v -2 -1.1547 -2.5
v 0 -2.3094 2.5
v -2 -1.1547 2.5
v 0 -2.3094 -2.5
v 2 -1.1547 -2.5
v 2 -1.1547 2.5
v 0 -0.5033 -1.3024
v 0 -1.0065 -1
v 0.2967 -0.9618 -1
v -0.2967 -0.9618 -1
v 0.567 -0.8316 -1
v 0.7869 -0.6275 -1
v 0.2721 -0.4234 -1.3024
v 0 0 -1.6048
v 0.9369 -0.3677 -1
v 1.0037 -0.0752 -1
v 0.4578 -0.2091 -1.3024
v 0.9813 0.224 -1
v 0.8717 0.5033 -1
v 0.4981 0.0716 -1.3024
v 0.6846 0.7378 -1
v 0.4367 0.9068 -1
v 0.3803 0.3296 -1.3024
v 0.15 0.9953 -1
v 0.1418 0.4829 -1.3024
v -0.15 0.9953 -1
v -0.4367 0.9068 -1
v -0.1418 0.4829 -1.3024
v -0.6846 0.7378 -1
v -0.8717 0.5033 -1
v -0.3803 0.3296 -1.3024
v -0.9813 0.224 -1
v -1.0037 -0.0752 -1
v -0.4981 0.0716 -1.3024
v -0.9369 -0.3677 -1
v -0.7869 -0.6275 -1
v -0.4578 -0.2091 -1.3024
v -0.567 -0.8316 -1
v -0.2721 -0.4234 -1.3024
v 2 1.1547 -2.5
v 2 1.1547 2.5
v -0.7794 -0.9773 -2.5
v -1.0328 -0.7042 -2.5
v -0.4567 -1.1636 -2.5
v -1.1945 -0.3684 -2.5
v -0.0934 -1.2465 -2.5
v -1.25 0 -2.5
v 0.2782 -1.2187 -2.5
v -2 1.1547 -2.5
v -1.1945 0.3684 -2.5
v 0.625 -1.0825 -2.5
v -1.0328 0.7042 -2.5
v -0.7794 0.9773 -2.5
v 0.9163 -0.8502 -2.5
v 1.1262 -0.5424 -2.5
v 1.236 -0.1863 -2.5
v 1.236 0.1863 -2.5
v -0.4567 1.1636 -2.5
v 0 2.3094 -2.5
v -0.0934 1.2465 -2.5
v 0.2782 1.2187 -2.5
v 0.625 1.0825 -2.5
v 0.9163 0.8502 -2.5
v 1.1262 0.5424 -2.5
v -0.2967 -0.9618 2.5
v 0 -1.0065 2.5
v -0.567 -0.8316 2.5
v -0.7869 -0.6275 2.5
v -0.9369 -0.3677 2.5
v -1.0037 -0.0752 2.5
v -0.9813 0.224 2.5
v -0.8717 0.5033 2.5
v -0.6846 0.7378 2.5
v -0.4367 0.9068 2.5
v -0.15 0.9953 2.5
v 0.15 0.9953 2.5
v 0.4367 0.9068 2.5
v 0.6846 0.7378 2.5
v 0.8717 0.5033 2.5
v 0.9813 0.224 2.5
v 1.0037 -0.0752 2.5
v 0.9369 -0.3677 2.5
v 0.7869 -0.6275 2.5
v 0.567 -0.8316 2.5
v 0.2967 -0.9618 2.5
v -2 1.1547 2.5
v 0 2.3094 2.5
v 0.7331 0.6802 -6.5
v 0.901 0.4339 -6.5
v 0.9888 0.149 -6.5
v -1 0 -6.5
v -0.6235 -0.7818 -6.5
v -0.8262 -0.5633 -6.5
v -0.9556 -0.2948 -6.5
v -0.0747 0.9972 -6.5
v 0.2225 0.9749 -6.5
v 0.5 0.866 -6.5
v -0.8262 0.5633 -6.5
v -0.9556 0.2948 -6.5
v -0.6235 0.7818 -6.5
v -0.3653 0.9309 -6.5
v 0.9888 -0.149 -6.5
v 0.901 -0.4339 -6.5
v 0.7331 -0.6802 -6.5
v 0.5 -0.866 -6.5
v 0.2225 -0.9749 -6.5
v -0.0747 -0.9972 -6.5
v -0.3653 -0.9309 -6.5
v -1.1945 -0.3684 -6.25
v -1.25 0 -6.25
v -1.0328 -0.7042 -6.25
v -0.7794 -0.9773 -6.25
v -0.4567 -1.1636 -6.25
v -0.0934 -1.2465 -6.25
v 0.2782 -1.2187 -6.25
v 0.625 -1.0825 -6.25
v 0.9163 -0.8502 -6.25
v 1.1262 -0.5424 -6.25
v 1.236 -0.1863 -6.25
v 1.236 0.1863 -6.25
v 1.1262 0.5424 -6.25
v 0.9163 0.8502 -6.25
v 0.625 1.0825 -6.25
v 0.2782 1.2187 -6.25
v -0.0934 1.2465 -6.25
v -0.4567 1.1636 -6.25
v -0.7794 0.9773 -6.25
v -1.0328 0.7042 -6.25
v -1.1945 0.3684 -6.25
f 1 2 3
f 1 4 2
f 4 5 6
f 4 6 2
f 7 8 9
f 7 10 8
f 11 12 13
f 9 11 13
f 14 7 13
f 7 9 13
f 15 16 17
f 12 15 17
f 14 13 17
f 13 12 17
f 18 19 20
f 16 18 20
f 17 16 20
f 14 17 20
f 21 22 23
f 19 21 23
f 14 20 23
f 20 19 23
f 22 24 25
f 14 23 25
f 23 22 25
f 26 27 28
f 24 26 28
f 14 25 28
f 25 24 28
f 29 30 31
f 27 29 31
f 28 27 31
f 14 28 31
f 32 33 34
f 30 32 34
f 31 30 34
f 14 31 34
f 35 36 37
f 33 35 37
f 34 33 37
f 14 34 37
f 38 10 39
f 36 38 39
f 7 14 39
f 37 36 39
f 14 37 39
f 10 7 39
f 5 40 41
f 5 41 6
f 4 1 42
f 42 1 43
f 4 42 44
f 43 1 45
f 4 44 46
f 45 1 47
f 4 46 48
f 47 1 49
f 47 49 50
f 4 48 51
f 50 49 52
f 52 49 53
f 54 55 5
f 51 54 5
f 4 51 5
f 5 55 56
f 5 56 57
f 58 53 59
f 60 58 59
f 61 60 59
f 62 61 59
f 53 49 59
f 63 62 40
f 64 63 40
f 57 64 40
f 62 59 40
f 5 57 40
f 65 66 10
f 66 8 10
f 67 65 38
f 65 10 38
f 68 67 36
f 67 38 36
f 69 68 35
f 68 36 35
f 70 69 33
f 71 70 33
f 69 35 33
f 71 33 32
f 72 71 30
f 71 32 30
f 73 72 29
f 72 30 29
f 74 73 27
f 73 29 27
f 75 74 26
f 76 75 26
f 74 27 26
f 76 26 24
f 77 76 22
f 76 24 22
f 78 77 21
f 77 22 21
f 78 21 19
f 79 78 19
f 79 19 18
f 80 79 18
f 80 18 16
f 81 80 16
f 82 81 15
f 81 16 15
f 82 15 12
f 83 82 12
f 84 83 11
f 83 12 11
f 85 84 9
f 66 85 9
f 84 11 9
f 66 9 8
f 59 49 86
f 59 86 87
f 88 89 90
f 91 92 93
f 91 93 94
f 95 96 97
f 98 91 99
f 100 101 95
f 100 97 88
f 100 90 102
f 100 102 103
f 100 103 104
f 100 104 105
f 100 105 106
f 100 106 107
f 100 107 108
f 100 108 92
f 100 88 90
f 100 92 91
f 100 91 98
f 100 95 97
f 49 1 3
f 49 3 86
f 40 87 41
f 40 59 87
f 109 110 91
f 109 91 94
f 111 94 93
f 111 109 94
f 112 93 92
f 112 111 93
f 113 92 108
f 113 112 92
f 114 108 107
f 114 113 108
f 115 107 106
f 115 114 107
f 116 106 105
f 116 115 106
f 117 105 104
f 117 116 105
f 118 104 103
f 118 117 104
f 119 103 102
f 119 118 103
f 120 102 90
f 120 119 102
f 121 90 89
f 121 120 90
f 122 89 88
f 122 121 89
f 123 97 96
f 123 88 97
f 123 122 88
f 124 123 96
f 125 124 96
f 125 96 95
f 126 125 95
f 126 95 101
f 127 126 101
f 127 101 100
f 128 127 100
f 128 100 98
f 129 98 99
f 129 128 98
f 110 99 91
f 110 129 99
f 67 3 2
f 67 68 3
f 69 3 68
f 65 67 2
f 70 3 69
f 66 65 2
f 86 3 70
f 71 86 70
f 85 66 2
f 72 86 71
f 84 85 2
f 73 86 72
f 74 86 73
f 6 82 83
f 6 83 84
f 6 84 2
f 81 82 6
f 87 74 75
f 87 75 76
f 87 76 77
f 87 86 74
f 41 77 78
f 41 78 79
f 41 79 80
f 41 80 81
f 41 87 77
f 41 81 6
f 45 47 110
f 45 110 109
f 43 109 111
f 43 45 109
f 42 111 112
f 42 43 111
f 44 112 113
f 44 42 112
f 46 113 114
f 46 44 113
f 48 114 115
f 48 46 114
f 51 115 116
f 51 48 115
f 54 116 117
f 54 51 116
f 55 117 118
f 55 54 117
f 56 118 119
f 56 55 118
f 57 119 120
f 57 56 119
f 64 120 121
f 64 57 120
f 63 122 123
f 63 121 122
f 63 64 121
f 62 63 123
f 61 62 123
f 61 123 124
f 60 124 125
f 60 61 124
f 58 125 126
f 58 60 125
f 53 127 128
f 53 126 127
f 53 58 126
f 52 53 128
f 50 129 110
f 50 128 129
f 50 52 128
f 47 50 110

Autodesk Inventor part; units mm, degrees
ref_plane "YZ Plane" through (0, 0, 0) normal (1, 0, 0) x (0, 1, 0)
ref_plane "XZ Plane" through (0, 0, 0) normal (0, 1, 0) x (-1, 0, 0)
ref_plane "XY Plane" through (0, 0, 0) normal (0, 0, 1) x (1, 0, 0)
sketch "Skizze1" plane through (0, 0, 0) normal (0, 0, 1) x (1, 0, 0)
  line L0 (-2, 0) -> (2, 0) construction
  line L1 (0, 2) -> (0, -2) construction
  line L2 (-2, 1.1547) -> (0, 2.3094)
  line L3 (0, 2.3094) -> (2, 1.1547)
  line L4 (2, 1.1547) -> (2, -1.1547)
  line L5 (2, -1.1547) -> (0, -2.3094)
  line L6 (0, -2.3094) -> (-2, -1.1547)
  line L7 (-2, -1.1547) -> (-2, 1.1547)
  point P0 (0, 0)
  point P1 (0, 0)
  point P2 (0, 0)
  dimension "d0" = 4
  dimension "d1" = 4
  dimension "d2" = 4
extrude "Extrusion1" add sketch "Skizze1" along normal mid plane 5
sketch "Skizze3" plane through (0, 0, 2.5) normal (0, 0, 1) x (1, 0, 0)
  point P0 (0, 0)
  point P1 (0, 0)
hole "Bohrung1" at (0, 0, 2.5) direction (0, 0, -1) diameter 2.013 depth 3.5 tip angle 118 thread size "M2.5x0.45" class "6H" standard "ISO Metric profile"
sketch "Skizze4" plane through (0, 0, -2.5) normal (0, 0, -1) x (-1, 0, 0)
  circle A0 centre (0, 0) radius 1.25
  dimension "d17" = 2.5
extrude "Extrusion3" add sketch "Skizze4" along normal blind 4
thread "Gewinde2" size "M2.5x0.45" class "6g" standard "ISO Metric profile" full length
chamfer "Fase1" distance 0.25 angle 45 1 edges at (1.25, 0, -6.5)
properties part number "standoff (1466814)"
